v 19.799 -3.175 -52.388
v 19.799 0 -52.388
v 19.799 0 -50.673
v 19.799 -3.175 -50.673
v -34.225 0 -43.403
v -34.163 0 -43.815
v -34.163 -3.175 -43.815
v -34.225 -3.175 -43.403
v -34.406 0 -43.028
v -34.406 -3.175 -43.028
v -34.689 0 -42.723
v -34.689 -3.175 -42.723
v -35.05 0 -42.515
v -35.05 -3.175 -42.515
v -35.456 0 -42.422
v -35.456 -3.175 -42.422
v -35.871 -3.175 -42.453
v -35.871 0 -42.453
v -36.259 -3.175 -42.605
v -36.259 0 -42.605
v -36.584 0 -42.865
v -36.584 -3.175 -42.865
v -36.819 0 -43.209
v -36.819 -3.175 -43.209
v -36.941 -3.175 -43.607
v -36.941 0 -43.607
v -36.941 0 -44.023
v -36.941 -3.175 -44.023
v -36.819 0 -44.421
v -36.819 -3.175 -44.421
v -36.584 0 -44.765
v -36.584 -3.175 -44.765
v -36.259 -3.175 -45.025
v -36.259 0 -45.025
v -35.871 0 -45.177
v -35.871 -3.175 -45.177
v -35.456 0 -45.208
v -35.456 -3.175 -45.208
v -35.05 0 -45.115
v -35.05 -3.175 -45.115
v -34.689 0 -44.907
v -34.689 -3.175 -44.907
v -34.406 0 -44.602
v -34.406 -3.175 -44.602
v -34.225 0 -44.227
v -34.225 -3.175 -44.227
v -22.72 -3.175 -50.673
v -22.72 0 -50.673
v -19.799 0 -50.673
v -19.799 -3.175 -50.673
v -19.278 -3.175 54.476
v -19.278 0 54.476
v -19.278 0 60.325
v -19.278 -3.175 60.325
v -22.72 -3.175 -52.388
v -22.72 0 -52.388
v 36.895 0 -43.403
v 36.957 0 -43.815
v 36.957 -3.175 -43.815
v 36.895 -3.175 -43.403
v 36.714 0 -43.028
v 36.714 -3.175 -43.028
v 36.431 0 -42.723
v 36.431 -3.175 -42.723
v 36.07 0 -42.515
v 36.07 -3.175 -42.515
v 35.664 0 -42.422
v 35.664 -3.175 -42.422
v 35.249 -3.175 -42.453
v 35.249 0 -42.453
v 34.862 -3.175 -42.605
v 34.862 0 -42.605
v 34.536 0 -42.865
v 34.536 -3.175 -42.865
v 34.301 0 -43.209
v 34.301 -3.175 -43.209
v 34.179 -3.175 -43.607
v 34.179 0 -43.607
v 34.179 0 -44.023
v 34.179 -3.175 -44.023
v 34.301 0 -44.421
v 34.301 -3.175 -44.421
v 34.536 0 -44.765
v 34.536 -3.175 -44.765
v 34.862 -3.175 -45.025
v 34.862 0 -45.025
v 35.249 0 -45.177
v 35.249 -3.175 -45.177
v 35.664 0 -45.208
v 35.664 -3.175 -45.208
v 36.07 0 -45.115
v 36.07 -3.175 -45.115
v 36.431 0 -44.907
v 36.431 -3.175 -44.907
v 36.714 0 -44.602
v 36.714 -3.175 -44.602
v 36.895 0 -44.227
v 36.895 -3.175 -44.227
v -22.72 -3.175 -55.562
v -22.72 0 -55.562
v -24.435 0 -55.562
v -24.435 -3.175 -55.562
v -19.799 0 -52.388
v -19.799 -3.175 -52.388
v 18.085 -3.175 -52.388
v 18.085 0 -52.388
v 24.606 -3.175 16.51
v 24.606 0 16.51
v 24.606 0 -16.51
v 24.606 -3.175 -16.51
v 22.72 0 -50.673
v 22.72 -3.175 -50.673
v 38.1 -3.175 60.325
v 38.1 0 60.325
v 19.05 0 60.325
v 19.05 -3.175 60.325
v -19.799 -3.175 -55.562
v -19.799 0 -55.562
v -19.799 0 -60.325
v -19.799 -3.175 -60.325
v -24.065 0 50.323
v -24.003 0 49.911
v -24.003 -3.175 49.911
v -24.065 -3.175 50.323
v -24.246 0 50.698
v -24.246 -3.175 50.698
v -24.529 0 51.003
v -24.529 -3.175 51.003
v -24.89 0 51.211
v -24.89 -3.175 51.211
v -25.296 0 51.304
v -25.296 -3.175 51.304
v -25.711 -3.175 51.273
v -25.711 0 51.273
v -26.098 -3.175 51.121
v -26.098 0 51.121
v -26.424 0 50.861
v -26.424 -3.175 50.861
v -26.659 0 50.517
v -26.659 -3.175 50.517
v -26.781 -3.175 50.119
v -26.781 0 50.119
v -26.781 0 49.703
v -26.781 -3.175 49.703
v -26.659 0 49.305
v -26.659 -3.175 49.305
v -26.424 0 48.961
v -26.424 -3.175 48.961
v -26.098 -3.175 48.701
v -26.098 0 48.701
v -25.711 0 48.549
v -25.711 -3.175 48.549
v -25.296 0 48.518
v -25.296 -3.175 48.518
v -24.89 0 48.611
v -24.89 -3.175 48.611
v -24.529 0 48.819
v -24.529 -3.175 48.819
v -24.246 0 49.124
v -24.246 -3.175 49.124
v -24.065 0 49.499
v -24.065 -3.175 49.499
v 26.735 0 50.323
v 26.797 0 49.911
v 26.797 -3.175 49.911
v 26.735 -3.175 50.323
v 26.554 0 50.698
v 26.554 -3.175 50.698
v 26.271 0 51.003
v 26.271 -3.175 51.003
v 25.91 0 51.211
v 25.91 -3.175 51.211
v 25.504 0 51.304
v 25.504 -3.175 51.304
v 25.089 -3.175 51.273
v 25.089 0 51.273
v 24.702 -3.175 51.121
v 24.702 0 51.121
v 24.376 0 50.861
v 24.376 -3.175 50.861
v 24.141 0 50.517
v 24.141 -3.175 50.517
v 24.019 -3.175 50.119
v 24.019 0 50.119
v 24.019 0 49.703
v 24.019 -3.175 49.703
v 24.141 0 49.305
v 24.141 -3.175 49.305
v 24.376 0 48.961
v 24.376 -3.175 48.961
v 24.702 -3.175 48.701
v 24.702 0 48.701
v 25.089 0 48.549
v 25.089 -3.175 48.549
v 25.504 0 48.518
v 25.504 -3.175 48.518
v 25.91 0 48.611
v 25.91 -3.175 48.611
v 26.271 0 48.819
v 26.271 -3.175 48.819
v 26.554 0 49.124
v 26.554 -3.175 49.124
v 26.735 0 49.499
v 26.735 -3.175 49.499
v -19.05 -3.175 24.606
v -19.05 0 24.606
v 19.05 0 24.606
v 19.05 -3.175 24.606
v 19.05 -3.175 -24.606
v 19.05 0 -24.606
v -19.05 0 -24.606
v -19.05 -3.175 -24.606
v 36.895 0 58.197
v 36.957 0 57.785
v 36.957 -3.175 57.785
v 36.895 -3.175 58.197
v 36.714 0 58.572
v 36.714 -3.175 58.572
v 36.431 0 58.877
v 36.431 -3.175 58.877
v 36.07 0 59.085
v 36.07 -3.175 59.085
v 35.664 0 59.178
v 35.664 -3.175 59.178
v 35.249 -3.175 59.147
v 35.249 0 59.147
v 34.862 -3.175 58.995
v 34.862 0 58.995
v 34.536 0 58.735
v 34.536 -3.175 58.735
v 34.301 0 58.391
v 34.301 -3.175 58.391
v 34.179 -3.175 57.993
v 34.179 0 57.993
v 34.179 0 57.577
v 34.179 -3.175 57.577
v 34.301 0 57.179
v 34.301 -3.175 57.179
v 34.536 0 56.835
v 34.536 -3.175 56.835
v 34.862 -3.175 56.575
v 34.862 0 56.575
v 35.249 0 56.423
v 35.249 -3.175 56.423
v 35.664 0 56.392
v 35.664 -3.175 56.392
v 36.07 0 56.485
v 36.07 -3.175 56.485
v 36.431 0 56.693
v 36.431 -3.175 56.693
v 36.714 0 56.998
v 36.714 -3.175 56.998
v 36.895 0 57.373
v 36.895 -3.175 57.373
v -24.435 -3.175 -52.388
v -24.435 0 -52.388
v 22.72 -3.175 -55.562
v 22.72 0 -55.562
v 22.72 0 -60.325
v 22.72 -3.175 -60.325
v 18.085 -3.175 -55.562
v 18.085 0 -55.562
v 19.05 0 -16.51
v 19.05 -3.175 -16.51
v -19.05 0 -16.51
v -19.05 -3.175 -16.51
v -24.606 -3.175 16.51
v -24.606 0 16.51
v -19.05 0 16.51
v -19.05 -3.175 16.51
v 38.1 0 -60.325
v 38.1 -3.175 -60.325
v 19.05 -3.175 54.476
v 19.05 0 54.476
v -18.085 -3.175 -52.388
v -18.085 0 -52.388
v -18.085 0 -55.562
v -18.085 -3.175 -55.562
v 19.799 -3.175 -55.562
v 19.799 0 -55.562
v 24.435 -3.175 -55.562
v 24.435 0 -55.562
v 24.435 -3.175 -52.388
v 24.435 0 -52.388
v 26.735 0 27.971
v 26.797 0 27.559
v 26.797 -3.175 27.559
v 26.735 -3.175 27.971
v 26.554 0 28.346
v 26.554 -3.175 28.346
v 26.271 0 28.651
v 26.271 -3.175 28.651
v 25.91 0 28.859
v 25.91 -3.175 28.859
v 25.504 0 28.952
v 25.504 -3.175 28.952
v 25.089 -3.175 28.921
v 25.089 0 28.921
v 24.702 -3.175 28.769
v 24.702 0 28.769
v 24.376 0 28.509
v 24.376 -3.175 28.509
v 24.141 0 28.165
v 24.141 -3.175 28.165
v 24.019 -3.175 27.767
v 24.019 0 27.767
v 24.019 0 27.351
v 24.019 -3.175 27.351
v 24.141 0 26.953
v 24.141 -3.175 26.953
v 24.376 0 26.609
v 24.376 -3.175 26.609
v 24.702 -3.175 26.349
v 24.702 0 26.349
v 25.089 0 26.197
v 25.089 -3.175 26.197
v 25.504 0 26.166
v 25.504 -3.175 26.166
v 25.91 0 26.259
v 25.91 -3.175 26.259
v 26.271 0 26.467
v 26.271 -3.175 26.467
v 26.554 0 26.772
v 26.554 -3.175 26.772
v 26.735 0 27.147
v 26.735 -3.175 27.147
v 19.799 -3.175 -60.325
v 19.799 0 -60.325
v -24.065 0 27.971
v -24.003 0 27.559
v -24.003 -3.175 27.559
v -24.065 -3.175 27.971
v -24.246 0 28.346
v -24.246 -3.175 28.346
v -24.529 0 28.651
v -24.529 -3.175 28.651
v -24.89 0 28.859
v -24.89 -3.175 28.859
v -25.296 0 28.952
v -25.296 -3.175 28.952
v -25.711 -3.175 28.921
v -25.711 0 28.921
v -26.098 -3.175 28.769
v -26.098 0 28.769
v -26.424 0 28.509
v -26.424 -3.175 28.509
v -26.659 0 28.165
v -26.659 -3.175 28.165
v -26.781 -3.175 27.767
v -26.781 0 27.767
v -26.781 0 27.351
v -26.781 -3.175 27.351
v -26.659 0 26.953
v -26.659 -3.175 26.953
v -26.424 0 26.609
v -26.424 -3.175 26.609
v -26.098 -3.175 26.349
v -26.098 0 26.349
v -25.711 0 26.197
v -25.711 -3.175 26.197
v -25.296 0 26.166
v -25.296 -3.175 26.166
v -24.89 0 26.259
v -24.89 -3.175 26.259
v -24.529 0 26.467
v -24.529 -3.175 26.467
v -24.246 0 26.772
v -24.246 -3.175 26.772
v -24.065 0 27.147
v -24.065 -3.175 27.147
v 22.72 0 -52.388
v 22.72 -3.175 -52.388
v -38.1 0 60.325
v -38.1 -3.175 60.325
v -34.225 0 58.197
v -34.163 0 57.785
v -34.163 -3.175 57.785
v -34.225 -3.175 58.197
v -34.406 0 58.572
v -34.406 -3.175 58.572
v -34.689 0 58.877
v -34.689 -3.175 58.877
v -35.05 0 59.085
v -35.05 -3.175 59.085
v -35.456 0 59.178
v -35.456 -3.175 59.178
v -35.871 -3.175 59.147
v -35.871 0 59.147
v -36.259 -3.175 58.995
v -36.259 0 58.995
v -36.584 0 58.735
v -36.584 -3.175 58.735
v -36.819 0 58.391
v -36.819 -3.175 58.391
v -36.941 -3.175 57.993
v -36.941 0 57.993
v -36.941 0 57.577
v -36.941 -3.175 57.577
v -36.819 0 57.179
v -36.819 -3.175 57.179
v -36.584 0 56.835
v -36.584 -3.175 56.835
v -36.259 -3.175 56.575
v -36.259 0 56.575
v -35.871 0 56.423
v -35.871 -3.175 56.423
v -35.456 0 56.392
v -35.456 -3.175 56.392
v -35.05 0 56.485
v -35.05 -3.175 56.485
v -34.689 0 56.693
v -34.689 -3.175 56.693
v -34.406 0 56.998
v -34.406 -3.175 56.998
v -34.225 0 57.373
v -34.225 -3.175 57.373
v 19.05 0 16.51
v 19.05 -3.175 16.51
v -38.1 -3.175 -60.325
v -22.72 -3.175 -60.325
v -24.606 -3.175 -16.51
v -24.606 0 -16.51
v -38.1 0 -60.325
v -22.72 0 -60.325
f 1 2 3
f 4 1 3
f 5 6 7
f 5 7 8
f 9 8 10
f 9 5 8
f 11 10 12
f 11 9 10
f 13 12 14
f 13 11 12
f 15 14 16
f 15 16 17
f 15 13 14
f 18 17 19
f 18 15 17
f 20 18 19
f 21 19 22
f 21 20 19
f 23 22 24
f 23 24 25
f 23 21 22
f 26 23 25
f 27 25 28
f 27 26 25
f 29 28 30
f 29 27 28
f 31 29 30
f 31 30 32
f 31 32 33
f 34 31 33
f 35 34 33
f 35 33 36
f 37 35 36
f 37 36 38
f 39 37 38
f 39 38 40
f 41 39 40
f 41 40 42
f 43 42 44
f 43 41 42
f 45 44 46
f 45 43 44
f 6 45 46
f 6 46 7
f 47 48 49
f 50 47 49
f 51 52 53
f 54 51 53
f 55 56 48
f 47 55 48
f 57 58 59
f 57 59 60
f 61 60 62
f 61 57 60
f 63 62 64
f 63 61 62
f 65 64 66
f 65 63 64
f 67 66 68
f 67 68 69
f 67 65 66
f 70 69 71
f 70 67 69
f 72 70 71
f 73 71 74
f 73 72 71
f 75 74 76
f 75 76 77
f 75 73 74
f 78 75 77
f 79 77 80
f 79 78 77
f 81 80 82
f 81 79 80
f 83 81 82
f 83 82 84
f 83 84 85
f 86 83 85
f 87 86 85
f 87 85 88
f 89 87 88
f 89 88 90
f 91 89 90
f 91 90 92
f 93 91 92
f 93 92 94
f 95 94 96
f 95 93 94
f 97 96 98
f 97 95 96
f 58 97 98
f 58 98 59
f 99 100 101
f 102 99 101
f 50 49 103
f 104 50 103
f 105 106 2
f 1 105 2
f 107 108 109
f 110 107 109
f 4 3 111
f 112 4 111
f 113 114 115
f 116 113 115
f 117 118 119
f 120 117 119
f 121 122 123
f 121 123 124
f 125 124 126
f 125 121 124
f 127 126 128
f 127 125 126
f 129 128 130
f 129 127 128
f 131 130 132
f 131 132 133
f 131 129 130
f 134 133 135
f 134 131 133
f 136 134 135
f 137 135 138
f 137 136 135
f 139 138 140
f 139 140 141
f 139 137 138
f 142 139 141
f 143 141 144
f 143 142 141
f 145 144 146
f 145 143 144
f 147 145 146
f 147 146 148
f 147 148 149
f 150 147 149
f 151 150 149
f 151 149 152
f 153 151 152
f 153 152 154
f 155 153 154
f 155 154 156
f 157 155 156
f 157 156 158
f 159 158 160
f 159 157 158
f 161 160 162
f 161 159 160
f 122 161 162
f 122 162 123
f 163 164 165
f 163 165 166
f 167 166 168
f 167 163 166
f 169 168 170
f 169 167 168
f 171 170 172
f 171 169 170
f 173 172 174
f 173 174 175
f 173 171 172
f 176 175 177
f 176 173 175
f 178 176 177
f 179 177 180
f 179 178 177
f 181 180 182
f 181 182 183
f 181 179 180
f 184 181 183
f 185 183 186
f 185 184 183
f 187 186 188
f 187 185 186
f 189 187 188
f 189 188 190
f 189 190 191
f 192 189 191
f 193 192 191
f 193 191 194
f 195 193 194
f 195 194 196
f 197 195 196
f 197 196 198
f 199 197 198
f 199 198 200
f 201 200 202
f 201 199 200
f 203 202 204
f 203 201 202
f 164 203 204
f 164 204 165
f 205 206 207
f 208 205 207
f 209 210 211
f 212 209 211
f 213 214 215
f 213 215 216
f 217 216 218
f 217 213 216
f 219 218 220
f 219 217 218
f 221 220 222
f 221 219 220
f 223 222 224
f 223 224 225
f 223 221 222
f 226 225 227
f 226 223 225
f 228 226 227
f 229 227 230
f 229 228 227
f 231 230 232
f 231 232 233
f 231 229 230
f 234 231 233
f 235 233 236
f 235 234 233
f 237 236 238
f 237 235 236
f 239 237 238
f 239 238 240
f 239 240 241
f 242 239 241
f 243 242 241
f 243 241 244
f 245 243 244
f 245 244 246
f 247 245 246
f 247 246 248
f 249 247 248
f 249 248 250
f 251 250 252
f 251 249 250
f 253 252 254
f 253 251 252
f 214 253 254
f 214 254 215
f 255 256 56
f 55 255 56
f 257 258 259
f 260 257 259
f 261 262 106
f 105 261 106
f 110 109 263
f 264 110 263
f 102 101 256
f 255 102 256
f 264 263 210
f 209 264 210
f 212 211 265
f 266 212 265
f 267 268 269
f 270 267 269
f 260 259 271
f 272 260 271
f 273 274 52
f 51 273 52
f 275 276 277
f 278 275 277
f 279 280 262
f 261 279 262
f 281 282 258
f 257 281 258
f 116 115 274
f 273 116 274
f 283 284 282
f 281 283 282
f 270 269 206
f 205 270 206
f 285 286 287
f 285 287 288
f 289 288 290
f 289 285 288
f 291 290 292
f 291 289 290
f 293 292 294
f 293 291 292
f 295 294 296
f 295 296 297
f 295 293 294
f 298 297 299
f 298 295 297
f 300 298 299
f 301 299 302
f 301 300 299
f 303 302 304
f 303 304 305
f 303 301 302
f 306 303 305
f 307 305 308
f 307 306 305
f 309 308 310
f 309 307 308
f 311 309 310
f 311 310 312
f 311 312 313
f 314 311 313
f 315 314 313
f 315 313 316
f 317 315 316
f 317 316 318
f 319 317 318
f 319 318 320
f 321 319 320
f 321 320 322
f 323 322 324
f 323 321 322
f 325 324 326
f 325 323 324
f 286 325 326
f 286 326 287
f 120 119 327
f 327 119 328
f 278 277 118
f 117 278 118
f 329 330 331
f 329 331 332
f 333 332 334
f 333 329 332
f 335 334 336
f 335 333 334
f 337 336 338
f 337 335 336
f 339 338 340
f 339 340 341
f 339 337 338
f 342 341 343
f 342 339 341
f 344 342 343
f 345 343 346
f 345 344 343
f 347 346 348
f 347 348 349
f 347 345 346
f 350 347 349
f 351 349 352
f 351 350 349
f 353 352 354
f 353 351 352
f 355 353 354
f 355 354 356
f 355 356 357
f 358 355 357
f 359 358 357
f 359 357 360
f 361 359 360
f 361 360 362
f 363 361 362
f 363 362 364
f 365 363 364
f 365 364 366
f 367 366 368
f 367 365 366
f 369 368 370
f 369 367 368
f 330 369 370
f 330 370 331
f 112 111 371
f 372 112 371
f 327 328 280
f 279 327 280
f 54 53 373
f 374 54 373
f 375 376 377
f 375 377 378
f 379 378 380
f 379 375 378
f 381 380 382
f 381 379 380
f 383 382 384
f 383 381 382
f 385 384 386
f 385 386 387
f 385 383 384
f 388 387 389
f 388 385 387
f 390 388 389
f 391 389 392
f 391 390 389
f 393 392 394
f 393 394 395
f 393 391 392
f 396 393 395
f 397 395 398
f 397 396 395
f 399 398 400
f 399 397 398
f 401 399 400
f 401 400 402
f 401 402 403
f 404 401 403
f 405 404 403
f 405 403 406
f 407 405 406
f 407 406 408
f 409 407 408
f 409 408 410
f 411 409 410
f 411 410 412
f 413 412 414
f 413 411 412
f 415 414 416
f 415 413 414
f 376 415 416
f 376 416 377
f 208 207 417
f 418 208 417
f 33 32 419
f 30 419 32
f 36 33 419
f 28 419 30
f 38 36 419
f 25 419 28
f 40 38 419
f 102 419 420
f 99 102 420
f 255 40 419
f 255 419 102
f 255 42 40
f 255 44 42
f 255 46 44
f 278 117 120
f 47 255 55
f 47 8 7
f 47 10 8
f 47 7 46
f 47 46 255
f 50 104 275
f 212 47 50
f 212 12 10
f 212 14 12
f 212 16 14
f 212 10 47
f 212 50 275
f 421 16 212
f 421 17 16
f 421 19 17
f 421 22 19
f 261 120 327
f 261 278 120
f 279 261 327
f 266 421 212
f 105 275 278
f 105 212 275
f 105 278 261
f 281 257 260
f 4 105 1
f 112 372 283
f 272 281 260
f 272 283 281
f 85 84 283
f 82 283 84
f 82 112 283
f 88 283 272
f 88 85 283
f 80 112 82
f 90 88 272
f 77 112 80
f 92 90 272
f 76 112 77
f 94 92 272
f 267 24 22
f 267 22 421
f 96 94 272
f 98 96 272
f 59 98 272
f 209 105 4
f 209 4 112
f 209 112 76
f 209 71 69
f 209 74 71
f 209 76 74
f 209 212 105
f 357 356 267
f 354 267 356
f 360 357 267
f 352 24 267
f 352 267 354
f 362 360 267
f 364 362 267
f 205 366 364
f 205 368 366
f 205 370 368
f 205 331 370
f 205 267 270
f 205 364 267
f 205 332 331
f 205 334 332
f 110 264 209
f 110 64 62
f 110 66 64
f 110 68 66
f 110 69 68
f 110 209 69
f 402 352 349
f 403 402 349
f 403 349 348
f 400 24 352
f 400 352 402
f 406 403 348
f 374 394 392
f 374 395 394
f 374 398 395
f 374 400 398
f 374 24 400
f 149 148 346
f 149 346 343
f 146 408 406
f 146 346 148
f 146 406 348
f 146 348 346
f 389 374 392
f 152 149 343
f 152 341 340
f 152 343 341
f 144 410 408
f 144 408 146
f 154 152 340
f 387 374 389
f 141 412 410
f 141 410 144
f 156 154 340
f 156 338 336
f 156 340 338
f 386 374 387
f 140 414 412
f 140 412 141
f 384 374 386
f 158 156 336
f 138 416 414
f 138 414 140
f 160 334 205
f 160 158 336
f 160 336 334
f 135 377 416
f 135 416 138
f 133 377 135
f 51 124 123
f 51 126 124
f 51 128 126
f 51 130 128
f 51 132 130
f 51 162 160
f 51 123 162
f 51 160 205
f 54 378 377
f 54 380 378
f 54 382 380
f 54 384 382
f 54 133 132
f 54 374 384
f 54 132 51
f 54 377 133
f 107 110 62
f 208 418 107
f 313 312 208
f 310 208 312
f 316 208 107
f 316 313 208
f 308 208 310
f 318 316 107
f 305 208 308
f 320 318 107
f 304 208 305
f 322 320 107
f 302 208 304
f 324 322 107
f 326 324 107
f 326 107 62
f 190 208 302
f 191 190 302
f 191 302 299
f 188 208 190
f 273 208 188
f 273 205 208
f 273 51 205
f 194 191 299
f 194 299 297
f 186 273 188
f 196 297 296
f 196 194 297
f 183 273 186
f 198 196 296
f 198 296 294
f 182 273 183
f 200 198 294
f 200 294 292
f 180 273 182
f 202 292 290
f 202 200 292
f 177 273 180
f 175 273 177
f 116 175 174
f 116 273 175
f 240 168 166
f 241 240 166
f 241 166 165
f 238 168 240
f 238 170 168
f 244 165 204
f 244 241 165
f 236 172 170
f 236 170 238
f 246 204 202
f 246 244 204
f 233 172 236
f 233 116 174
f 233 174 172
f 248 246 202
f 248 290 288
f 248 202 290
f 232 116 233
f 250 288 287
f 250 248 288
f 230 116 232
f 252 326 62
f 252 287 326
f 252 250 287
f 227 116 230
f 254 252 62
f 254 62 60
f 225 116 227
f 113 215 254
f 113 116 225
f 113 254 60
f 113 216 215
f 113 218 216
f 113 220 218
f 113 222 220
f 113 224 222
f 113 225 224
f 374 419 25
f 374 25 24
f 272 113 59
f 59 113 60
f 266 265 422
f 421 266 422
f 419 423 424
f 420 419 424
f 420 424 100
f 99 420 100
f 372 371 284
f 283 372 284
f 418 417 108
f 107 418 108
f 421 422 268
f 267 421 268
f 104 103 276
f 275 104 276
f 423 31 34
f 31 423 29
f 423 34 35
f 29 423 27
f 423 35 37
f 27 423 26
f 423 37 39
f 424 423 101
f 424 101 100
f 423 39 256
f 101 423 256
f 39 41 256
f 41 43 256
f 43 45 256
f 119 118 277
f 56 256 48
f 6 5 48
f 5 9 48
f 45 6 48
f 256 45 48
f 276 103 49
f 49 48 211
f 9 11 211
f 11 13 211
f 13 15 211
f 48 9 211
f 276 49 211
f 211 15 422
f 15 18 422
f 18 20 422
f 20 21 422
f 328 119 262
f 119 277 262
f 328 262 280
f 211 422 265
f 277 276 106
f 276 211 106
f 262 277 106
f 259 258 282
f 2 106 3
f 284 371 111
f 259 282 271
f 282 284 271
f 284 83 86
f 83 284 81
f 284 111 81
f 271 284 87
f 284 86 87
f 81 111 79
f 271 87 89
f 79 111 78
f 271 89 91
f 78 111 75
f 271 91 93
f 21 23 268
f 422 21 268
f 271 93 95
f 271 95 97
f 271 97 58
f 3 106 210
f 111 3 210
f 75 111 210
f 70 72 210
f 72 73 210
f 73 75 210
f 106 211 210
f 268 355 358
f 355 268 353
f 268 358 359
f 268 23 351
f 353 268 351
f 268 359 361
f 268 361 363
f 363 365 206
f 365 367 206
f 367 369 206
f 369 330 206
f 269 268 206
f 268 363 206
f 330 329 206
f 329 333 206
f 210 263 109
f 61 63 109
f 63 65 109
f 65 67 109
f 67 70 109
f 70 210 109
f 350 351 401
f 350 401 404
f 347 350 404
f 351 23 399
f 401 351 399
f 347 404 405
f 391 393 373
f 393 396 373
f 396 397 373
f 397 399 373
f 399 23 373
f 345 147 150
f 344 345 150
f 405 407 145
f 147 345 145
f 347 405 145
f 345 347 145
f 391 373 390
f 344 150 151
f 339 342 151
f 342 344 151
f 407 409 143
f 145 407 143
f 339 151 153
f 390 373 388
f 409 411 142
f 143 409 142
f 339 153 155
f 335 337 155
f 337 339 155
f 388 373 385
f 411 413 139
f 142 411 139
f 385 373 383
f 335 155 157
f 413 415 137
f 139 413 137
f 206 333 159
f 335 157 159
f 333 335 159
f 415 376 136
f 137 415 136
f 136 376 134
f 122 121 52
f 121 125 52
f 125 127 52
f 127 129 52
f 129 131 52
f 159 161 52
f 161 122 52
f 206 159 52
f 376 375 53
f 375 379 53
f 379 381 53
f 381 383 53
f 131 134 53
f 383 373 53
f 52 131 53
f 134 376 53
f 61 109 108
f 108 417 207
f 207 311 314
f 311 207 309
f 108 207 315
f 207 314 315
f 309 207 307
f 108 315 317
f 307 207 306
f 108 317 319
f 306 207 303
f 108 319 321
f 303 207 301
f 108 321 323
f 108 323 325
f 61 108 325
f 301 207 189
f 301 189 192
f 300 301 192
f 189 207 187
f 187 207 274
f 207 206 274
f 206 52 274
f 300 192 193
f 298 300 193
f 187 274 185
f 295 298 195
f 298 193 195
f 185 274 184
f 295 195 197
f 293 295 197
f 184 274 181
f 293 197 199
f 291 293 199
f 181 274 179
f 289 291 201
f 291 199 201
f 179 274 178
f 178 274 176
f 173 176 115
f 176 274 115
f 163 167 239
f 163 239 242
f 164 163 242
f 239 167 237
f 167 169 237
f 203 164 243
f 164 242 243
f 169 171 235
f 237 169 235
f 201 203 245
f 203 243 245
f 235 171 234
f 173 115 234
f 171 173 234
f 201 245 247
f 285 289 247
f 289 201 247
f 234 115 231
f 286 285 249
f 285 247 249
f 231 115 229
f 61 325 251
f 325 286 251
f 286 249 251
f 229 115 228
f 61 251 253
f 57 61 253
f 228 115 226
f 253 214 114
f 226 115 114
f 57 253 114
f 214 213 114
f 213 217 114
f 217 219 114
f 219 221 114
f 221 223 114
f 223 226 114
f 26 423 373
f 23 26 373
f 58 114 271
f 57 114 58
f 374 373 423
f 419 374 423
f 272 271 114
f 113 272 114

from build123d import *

# Parameters (mm, degrees)
F0_R     = 1.397
F1_DEPTH = 3.175


with BuildPart() as f1:
    # F0 (on Front) → F1 (new body)
    with BuildSketch(Plane.XZ):
        Polygon((38.1, 38.735), (38.1, 60.325), (19.05, 60.325), (19.05, 54.476305), (-19.277798, 54.476305), (-19.277798, 60.325), (-38.1, 60.325), (-38.1, -60.325), (-22.7203, -60.325), (-22.7203, -55.5625), (-24.4348, -55.5625), (-24.4348, -52.3875), (-22.7203, -52.3875), (-22.7203, -50.673), (-19.7993, -50.673), (-19.7993, -52.3875), (-18.0848, -52.3875), (-18.0848, -55.5625), (-19.7993, -55.5625), (-19.7993, -60.325), (19.7993, -60.325), (19.7993, -55.5625), (18.0848, -55.5625), (18.0848, -52.3875), (19.7993, -52.3875), (19.7993, -50.673), (22.7203, -50.673), (22.7203, -52.3875), (24.4348, -52.3875), (24.4348, -55.5625), (22.7203, -55.5625), (22.7203, -60.325), (38.1, -60.325), align=None)
        with Locations((-35.56, -43.815)):
            Circle(F0_R, mode=Mode.SUBTRACT)
        with Locations((35.56, -43.815)):
            Circle(F0_R, mode=Mode.SUBTRACT)
        with Locations((-25.4, 27.559)):
            Circle(F0_R, mode=Mode.SUBTRACT)
        with Locations((-35.56, 57.785)):
            Circle(F0_R, mode=Mode.SUBTRACT)
        with Locations((-25.4, 49.911)):
            Circle(F0_R, mode=Mode.SUBTRACT)
        Polygon((-19.05, 24.60625), (19.05, 24.60625), (19.05, 16.51), (24.60625, 16.51), (24.60625, -16.51), (19.05, -16.51), (19.05, -24.60625), (-19.05, -24.60625), (-19.05, -16.51), (-24.60625, -16.51), (-24.60625, 16.51), (-19.05, 16.51), align=None, mode=Mode.SUBTRACT)
        with Locations((25.4, 27.559)):
            Circle(F0_R, mode=Mode.SUBTRACT)
        with Locations((25.4, 49.911)):
            Circle(F0_R, mode=Mode.SUBTRACT)
        with Locations((35.56, 57.785)):
            Circle(F0_R, mode=Mode.SUBTRACT)
    extrude(amount=F1_DEPTH)


solid = f1.part
